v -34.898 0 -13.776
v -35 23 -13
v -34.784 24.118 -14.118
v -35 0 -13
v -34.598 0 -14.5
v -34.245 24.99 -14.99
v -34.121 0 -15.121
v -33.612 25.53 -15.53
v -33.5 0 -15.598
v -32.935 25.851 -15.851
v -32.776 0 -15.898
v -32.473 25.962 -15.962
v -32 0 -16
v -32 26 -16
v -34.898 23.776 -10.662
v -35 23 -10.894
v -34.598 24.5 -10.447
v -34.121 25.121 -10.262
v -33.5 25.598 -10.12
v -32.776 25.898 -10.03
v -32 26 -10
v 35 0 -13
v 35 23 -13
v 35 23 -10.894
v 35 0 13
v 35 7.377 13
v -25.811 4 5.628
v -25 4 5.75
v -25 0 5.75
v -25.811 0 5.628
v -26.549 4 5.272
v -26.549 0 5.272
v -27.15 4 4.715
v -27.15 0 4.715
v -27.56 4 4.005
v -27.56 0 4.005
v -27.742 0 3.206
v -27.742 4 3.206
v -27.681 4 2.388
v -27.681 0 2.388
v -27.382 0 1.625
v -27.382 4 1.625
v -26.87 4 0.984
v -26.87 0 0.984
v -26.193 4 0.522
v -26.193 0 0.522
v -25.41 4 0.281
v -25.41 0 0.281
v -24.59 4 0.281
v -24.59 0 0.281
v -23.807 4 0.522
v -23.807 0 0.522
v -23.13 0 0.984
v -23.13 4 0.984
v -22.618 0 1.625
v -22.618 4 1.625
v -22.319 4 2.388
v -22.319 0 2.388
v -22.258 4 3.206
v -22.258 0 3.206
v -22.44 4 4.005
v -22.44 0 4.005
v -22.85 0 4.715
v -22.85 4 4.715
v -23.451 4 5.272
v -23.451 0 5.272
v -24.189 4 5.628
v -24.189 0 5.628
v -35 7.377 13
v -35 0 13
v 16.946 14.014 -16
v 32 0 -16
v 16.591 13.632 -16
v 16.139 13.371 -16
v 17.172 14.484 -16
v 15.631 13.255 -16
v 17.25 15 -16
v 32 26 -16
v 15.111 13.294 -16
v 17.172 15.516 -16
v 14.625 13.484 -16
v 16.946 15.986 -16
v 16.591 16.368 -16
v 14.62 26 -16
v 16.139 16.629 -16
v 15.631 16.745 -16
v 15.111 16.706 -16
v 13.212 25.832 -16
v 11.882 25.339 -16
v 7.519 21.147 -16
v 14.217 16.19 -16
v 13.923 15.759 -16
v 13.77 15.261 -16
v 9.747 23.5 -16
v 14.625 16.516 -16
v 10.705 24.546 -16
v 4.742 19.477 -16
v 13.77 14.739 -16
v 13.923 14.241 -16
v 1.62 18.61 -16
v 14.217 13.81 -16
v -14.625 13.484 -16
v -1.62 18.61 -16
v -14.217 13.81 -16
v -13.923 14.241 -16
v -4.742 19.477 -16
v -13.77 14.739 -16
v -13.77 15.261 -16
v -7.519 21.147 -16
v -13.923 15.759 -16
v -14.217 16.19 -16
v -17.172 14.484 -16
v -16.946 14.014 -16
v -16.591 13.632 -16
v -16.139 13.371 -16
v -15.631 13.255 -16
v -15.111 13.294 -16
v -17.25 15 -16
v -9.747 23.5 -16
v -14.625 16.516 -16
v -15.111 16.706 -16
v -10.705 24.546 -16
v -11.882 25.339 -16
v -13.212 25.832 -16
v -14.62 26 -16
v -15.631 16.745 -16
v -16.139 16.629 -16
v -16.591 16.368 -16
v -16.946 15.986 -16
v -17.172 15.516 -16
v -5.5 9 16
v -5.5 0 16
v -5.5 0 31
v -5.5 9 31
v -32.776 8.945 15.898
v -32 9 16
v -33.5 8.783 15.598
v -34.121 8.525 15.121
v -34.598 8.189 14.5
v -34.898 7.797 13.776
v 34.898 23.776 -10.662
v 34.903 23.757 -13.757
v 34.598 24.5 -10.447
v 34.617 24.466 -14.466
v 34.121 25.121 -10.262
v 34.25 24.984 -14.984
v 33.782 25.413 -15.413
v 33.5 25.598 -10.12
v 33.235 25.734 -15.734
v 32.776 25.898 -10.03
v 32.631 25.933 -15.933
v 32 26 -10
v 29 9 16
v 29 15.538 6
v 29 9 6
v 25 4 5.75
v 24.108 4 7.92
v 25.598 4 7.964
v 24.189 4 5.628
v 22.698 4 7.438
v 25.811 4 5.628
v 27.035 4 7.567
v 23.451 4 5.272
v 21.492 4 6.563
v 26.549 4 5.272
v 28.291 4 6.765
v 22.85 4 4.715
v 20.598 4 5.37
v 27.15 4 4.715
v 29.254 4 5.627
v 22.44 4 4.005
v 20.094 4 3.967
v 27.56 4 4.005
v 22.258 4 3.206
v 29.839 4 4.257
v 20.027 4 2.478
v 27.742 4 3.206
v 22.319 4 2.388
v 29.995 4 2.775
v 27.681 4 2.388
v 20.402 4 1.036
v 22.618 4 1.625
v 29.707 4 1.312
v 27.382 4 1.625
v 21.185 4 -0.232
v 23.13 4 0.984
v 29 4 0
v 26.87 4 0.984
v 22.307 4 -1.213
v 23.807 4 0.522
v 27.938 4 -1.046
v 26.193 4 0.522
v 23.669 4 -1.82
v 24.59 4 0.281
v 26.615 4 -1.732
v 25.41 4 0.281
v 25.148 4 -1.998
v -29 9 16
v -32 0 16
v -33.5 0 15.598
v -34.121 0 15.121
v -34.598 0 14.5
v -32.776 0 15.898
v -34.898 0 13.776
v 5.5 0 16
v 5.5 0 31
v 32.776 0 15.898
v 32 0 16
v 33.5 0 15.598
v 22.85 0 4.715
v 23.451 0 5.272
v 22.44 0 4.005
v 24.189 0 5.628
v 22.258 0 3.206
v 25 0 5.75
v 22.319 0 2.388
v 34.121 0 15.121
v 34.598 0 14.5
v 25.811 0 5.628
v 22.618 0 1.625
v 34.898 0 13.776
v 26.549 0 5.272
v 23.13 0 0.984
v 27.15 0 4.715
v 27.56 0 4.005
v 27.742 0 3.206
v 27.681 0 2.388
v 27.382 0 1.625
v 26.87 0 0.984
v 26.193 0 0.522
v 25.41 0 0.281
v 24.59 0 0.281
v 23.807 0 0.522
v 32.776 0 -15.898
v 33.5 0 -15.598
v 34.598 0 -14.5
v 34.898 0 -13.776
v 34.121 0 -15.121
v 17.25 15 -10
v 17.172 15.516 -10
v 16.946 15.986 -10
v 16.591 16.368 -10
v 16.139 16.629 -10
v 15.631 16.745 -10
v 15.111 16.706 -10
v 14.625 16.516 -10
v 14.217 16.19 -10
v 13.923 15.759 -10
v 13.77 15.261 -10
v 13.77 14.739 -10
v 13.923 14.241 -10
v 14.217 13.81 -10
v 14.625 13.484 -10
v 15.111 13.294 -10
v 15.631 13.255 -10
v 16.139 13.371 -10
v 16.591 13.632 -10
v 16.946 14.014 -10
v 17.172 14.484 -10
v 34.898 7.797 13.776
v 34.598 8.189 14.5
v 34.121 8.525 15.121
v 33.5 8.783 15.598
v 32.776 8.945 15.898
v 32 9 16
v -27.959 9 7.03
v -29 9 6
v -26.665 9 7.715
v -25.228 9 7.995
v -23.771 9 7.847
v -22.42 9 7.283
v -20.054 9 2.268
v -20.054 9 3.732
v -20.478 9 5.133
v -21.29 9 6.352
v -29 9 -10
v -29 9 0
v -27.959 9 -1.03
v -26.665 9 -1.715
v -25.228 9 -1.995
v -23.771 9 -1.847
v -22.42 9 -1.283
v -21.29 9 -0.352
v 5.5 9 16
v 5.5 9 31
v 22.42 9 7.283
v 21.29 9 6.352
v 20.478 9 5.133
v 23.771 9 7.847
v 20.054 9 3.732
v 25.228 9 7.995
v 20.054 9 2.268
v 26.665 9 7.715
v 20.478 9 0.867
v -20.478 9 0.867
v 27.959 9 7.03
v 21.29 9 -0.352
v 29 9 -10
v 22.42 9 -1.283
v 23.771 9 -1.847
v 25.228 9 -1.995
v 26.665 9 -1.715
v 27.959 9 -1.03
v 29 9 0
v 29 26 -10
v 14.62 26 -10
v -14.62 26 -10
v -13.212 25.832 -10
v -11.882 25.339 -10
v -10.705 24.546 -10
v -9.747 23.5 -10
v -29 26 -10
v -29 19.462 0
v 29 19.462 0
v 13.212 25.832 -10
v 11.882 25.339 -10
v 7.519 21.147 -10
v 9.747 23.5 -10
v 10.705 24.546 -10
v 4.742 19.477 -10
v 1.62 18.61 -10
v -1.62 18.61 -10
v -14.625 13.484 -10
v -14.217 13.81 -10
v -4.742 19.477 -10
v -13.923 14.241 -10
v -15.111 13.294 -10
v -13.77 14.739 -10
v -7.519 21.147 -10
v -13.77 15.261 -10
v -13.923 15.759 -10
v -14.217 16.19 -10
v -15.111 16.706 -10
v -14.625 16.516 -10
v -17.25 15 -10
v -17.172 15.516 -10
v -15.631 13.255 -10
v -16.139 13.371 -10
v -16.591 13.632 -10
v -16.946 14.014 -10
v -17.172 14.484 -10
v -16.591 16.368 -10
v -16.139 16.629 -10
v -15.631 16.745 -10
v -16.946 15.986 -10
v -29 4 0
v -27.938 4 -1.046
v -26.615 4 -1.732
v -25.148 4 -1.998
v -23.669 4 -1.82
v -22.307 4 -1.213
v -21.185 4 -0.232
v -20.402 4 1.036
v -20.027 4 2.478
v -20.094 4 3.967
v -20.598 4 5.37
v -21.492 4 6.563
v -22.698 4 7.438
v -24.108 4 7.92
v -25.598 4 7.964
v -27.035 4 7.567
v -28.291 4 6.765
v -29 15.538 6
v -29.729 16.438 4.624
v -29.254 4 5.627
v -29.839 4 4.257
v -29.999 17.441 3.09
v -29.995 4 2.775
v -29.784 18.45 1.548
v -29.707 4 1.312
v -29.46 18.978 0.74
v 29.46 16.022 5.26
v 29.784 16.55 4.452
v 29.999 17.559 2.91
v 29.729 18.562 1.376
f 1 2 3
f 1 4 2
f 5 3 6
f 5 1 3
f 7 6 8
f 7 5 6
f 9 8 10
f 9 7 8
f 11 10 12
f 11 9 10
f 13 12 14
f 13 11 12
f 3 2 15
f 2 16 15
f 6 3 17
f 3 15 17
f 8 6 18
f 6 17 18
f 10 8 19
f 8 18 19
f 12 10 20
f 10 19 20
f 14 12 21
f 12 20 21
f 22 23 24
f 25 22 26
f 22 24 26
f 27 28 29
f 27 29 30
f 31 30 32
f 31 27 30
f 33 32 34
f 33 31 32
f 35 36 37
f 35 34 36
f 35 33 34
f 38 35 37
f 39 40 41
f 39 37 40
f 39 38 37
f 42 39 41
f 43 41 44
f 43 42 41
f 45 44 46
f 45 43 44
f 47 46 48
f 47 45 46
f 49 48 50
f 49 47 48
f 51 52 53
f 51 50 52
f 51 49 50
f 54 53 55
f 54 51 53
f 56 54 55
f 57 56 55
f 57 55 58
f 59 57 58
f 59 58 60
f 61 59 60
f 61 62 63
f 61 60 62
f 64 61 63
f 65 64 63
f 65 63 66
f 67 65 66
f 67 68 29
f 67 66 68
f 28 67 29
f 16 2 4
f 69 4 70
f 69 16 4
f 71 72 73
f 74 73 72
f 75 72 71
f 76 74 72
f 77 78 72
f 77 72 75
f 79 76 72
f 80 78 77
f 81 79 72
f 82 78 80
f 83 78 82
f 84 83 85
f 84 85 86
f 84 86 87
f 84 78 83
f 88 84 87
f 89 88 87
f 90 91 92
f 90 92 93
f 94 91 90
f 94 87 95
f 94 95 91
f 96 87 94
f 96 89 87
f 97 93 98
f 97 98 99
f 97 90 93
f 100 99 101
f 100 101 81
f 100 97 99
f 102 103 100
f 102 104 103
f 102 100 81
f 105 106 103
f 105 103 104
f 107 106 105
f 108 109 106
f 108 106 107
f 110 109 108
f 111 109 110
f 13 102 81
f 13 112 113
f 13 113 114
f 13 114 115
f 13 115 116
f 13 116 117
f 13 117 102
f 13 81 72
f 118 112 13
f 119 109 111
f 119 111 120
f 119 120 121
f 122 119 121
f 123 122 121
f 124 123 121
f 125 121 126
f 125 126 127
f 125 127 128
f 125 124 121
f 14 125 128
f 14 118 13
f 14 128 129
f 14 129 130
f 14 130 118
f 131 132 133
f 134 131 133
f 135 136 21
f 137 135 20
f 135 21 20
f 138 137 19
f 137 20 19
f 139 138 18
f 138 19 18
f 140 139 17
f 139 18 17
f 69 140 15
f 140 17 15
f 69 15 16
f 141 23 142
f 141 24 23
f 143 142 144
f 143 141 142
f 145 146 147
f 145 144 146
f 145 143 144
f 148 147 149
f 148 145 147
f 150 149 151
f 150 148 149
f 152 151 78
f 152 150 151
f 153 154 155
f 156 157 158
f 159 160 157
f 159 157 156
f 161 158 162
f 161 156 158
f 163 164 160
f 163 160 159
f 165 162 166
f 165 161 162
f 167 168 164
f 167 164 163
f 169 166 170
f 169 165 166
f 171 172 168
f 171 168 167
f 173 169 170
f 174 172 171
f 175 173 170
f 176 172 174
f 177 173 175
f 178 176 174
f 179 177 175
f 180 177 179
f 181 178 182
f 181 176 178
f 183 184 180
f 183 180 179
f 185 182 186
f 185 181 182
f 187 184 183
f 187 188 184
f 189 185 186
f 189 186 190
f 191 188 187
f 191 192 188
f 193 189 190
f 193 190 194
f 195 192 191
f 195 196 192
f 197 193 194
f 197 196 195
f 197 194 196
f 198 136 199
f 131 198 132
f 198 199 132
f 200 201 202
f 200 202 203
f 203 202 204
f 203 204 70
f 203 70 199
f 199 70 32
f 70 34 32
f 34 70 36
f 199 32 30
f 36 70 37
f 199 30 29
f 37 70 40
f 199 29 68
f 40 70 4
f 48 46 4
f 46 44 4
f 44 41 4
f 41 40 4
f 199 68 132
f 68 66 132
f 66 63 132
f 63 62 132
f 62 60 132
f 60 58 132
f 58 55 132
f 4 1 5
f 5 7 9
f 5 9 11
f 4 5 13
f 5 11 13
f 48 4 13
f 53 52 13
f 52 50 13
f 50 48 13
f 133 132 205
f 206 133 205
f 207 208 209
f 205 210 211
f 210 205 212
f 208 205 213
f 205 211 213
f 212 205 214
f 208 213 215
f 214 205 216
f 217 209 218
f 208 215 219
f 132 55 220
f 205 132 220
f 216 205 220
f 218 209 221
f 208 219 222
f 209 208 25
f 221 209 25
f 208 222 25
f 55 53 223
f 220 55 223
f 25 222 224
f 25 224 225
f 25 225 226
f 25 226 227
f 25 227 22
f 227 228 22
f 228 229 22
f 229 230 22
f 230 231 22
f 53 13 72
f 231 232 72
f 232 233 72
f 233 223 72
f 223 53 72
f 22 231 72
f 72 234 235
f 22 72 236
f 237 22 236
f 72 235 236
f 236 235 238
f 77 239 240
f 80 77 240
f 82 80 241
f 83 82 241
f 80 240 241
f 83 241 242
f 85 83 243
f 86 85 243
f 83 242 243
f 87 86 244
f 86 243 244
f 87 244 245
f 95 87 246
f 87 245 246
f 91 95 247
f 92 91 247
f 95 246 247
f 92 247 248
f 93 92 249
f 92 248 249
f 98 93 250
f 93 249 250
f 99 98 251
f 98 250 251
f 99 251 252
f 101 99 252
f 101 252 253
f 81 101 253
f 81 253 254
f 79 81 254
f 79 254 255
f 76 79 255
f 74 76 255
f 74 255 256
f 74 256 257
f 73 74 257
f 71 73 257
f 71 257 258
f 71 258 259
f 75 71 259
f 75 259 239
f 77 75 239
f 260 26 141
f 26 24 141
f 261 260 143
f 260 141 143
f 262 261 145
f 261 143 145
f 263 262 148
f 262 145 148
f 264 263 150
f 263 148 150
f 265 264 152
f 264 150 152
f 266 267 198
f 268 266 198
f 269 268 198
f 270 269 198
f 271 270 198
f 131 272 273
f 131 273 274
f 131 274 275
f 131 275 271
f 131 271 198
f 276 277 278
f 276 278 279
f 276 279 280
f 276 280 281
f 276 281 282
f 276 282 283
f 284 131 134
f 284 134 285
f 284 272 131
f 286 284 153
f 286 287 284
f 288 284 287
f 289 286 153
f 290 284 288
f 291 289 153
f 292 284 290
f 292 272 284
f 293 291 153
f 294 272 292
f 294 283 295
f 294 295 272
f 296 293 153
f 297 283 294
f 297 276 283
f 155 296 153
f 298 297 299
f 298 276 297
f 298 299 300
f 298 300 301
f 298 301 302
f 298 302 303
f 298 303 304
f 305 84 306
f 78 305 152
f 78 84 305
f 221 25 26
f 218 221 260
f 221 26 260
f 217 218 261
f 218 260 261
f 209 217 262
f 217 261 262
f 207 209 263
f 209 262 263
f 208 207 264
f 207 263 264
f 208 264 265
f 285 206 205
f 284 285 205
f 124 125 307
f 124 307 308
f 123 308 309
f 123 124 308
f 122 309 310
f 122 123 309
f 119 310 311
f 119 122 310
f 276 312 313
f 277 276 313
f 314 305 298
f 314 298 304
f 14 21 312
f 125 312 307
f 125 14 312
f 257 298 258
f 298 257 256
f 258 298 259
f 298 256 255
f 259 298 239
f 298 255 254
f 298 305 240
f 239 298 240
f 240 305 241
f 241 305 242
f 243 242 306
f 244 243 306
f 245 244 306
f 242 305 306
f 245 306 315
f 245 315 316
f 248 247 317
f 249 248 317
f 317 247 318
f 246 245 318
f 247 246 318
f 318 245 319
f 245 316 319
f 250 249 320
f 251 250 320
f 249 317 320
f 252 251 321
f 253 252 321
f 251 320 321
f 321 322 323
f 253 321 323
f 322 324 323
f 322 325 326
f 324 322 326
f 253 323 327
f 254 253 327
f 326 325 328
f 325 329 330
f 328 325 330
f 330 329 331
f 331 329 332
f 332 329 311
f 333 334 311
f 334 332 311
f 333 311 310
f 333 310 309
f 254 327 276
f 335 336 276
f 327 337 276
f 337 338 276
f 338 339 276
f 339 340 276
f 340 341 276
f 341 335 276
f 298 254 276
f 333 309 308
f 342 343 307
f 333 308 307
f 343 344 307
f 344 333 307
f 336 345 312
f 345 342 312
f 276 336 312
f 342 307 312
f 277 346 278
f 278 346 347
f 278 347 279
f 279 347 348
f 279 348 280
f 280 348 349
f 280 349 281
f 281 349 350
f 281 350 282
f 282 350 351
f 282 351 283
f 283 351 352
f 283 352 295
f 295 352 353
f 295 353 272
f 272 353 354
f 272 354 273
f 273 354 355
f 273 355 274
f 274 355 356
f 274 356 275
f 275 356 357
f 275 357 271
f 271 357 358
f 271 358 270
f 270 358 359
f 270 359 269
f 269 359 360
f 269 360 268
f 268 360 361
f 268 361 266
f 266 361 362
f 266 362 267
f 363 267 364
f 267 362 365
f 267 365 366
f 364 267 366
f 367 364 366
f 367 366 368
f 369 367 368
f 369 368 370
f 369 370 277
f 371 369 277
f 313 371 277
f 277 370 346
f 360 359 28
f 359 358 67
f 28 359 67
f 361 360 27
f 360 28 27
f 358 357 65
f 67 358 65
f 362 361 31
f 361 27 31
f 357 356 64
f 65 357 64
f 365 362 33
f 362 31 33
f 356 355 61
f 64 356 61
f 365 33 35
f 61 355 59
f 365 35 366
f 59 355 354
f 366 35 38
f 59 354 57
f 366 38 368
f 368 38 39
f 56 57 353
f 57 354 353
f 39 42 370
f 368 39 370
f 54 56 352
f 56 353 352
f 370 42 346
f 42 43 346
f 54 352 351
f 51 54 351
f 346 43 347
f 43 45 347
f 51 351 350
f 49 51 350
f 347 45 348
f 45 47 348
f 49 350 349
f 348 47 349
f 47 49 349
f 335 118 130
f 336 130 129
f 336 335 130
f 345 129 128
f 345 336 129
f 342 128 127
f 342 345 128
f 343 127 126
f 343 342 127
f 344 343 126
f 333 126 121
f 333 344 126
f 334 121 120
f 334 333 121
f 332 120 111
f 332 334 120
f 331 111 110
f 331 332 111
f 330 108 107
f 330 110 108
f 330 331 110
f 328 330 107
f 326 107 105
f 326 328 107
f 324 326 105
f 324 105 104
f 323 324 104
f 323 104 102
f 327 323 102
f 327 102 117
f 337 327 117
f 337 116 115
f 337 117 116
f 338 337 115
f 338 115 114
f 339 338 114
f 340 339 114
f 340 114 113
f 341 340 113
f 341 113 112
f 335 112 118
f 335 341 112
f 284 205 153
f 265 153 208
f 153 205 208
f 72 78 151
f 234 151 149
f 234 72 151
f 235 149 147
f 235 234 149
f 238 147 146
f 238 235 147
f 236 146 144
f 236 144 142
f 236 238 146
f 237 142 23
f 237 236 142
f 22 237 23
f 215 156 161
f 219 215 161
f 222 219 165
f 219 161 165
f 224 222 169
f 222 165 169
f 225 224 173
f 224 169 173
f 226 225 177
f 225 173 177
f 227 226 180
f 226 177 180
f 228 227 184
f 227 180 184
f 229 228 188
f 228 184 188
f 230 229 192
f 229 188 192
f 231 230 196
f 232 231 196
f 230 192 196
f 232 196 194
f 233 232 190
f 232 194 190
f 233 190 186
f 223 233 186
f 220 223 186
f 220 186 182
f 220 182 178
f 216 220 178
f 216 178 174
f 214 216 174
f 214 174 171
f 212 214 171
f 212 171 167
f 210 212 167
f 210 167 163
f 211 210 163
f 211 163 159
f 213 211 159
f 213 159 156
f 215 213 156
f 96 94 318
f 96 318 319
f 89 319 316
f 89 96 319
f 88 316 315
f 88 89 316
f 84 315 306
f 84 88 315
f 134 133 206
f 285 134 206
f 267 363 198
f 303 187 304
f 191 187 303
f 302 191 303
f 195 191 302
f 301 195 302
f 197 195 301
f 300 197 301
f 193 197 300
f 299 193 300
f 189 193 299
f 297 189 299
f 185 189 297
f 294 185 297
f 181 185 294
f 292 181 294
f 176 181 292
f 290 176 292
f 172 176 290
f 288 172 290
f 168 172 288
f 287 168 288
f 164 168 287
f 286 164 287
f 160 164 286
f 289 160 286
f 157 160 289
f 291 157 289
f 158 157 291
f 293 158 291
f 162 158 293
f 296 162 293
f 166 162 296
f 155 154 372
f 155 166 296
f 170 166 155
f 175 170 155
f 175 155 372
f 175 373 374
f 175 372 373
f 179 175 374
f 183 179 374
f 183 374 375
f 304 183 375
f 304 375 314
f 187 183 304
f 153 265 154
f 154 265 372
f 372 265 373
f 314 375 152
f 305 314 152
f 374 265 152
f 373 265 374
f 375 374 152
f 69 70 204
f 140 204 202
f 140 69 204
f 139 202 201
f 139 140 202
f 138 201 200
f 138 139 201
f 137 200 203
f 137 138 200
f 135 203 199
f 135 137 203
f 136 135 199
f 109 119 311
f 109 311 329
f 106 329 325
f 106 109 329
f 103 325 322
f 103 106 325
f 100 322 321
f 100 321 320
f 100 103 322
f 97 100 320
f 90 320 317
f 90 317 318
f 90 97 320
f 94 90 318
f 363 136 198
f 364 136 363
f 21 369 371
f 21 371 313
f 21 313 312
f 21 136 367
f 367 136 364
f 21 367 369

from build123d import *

# Parameters (mm, degrees)
BOSS_EXTRUDE1_DEPTH = 9
BOSS_EXTRUDE2_DEPTH = 6
BOSS_EXTRUDE3_DEPTH = 6
SKETCH4_R           = 2.75
CUT_EXTRUDE1_DEPTH  = 50.749371855
CUT_EXTRUDE2_START  = -5
SKETCH5_R           = 5
CUT_EXTRUDE2_DEPTH  = 55.749371855
SKETCH6_R           = 1.75
CUT_EXTRUDE3_DEPTH  = 60.84981203
FILLET1_R           = 3


with BuildPart() as part:
    # Sketch1 → Boss-Extrude1 (new body)
    with BuildSketch(Plane(origin=(0, 0, 0), x_dir=(1, 0, 0), z_dir=(0, 1, 0))):
        Polygon((5.5, -16), (35, -16), (35, 16), (-35, 16), (-35, -16), (-5.5, -16), (-5.5, -31), (5.5, -31), align=None)
    extrude(amount=BOSS_EXTRUDE1_DEPTH)

    # Sketch2 → Boss-Extrude2 (add)
    with BuildSketch(Plane(origin=(0, 0, -16), x_dir=(-1, 0, 0), z_dir=(0, 0, -1))):
        with BuildLine():
            Line((-35, 9), (35, 9))
            Line((35, 9), (35, 26))
            Line((35, 26), (14.620191517, 26))
            ThreePointArc((14.620191517, 26), (11.88157873, 25.338539126), (9.746794345, 23.5))
            ThreePointArc((9.746794345, 23.5), (0, 18.5), (-9.746794345, 23.5))
            ThreePointArc((-9.746794345, 23.5), (-11.88157873, 25.338539126), (-14.620191517, 26))
            Line((-14.620191517, 26), (-35, 26))
            Line((-35, 26), (-35, 9))
        make_face()
    extrude(amount=-BOSS_EXTRUDE2_DEPTH)

    # Sketch3 → Boss-Extrude3 (add)
    with BuildSketch(Plane(origin=(35, 0, 0), x_dir=(0, 0, -1), z_dir=(1, 0, 0))):
        Polygon((-16, 9), (10, 26), (10, 9), align=None)
    boss_extrude3 = extrude(amount=-BOSS_EXTRUDE3_DEPTH)

    # Sketch4 → Cut-Extrude1 (cut, through all)
    with BuildSketch(Plane(origin=(0, 9, 0), x_dir=(1, 0, 0), z_dir=(0, 1, 0))):
        with Locations(Location((25, -3, 0), (0, 0, 270))):
            Circle(SKETCH4_R)
    cut_extrude1 = extrude(amount=-CUT_EXTRUDE1_DEPTH, mode=Mode.SUBTRACT)

    # Sketch5 → Cut-Extrude2 (cut)
    with BuildSketch(Plane(origin=(0, 9, 0), x_dir=(1, 0, 0), z_dir=(0, 1, 0)).offset(CUT_EXTRUDE2_START)):
        with Locations(Location((25, -3, 0), (0, 0, 36.869897646))):
            Circle(SKETCH5_R)
    cut_extrude2 = extrude(amount=CUT_EXTRUDE2_DEPTH, mode=Mode.SUBTRACT)

    # Sketch6 → Cut-Extrude3 (cut, through all)
    with BuildSketch(Plane.XY.offset(-10)):
        with Locations((15.5, 15)):
            Circle(SKETCH6_R)
    cut_extrude3 = extrude(amount=-CUT_EXTRUDE3_DEPTH, mode=Mode.SUBTRACT)

    # Mirror1: Boss-Extrude3, Cut-Extrude1, Cut-Extrude2, Cut-Extrude3 across plane
    add(boss_extrude3.mirror(Plane(origin=(0, 0, 0), x_dir=(0, 0, 1), z_dir=(1, 0, 0))))
    add(cut_extrude1.mirror(Plane(origin=(0, 0, 0), x_dir=(0, 0, 1), z_dir=(1, 0, 0))), mode=Mode.SUBTRACT)
    add(cut_extrude2.mirror(Plane(origin=(0, 0, 0), x_dir=(0, 0, 1), z_dir=(1, 0, 0))), mode=Mode.SUBTRACT)
    add(cut_extrude3.mirror(Plane(origin=(0, 0, 0), x_dir=(0, 0, 1), z_dir=(1, 0, 0))), mode=Mode.SUBTRACT)

    # Fillet1
    fillet1_edges = [part.edges().sort_by_distance(p)[0] for p in [
        (35, 4.5, 16),
        (-35, 4.5, 16),
        (-35, 13, -16),
        (35, 13, -16),
        (35, 26, -13),
        (-35, 26, -13),
        (35, 17.5, 3),
        (-35, 17.5, 3),
    ]]
    fillet(fillet1_edges, radius=FILLET1_R)


solid = part.part
